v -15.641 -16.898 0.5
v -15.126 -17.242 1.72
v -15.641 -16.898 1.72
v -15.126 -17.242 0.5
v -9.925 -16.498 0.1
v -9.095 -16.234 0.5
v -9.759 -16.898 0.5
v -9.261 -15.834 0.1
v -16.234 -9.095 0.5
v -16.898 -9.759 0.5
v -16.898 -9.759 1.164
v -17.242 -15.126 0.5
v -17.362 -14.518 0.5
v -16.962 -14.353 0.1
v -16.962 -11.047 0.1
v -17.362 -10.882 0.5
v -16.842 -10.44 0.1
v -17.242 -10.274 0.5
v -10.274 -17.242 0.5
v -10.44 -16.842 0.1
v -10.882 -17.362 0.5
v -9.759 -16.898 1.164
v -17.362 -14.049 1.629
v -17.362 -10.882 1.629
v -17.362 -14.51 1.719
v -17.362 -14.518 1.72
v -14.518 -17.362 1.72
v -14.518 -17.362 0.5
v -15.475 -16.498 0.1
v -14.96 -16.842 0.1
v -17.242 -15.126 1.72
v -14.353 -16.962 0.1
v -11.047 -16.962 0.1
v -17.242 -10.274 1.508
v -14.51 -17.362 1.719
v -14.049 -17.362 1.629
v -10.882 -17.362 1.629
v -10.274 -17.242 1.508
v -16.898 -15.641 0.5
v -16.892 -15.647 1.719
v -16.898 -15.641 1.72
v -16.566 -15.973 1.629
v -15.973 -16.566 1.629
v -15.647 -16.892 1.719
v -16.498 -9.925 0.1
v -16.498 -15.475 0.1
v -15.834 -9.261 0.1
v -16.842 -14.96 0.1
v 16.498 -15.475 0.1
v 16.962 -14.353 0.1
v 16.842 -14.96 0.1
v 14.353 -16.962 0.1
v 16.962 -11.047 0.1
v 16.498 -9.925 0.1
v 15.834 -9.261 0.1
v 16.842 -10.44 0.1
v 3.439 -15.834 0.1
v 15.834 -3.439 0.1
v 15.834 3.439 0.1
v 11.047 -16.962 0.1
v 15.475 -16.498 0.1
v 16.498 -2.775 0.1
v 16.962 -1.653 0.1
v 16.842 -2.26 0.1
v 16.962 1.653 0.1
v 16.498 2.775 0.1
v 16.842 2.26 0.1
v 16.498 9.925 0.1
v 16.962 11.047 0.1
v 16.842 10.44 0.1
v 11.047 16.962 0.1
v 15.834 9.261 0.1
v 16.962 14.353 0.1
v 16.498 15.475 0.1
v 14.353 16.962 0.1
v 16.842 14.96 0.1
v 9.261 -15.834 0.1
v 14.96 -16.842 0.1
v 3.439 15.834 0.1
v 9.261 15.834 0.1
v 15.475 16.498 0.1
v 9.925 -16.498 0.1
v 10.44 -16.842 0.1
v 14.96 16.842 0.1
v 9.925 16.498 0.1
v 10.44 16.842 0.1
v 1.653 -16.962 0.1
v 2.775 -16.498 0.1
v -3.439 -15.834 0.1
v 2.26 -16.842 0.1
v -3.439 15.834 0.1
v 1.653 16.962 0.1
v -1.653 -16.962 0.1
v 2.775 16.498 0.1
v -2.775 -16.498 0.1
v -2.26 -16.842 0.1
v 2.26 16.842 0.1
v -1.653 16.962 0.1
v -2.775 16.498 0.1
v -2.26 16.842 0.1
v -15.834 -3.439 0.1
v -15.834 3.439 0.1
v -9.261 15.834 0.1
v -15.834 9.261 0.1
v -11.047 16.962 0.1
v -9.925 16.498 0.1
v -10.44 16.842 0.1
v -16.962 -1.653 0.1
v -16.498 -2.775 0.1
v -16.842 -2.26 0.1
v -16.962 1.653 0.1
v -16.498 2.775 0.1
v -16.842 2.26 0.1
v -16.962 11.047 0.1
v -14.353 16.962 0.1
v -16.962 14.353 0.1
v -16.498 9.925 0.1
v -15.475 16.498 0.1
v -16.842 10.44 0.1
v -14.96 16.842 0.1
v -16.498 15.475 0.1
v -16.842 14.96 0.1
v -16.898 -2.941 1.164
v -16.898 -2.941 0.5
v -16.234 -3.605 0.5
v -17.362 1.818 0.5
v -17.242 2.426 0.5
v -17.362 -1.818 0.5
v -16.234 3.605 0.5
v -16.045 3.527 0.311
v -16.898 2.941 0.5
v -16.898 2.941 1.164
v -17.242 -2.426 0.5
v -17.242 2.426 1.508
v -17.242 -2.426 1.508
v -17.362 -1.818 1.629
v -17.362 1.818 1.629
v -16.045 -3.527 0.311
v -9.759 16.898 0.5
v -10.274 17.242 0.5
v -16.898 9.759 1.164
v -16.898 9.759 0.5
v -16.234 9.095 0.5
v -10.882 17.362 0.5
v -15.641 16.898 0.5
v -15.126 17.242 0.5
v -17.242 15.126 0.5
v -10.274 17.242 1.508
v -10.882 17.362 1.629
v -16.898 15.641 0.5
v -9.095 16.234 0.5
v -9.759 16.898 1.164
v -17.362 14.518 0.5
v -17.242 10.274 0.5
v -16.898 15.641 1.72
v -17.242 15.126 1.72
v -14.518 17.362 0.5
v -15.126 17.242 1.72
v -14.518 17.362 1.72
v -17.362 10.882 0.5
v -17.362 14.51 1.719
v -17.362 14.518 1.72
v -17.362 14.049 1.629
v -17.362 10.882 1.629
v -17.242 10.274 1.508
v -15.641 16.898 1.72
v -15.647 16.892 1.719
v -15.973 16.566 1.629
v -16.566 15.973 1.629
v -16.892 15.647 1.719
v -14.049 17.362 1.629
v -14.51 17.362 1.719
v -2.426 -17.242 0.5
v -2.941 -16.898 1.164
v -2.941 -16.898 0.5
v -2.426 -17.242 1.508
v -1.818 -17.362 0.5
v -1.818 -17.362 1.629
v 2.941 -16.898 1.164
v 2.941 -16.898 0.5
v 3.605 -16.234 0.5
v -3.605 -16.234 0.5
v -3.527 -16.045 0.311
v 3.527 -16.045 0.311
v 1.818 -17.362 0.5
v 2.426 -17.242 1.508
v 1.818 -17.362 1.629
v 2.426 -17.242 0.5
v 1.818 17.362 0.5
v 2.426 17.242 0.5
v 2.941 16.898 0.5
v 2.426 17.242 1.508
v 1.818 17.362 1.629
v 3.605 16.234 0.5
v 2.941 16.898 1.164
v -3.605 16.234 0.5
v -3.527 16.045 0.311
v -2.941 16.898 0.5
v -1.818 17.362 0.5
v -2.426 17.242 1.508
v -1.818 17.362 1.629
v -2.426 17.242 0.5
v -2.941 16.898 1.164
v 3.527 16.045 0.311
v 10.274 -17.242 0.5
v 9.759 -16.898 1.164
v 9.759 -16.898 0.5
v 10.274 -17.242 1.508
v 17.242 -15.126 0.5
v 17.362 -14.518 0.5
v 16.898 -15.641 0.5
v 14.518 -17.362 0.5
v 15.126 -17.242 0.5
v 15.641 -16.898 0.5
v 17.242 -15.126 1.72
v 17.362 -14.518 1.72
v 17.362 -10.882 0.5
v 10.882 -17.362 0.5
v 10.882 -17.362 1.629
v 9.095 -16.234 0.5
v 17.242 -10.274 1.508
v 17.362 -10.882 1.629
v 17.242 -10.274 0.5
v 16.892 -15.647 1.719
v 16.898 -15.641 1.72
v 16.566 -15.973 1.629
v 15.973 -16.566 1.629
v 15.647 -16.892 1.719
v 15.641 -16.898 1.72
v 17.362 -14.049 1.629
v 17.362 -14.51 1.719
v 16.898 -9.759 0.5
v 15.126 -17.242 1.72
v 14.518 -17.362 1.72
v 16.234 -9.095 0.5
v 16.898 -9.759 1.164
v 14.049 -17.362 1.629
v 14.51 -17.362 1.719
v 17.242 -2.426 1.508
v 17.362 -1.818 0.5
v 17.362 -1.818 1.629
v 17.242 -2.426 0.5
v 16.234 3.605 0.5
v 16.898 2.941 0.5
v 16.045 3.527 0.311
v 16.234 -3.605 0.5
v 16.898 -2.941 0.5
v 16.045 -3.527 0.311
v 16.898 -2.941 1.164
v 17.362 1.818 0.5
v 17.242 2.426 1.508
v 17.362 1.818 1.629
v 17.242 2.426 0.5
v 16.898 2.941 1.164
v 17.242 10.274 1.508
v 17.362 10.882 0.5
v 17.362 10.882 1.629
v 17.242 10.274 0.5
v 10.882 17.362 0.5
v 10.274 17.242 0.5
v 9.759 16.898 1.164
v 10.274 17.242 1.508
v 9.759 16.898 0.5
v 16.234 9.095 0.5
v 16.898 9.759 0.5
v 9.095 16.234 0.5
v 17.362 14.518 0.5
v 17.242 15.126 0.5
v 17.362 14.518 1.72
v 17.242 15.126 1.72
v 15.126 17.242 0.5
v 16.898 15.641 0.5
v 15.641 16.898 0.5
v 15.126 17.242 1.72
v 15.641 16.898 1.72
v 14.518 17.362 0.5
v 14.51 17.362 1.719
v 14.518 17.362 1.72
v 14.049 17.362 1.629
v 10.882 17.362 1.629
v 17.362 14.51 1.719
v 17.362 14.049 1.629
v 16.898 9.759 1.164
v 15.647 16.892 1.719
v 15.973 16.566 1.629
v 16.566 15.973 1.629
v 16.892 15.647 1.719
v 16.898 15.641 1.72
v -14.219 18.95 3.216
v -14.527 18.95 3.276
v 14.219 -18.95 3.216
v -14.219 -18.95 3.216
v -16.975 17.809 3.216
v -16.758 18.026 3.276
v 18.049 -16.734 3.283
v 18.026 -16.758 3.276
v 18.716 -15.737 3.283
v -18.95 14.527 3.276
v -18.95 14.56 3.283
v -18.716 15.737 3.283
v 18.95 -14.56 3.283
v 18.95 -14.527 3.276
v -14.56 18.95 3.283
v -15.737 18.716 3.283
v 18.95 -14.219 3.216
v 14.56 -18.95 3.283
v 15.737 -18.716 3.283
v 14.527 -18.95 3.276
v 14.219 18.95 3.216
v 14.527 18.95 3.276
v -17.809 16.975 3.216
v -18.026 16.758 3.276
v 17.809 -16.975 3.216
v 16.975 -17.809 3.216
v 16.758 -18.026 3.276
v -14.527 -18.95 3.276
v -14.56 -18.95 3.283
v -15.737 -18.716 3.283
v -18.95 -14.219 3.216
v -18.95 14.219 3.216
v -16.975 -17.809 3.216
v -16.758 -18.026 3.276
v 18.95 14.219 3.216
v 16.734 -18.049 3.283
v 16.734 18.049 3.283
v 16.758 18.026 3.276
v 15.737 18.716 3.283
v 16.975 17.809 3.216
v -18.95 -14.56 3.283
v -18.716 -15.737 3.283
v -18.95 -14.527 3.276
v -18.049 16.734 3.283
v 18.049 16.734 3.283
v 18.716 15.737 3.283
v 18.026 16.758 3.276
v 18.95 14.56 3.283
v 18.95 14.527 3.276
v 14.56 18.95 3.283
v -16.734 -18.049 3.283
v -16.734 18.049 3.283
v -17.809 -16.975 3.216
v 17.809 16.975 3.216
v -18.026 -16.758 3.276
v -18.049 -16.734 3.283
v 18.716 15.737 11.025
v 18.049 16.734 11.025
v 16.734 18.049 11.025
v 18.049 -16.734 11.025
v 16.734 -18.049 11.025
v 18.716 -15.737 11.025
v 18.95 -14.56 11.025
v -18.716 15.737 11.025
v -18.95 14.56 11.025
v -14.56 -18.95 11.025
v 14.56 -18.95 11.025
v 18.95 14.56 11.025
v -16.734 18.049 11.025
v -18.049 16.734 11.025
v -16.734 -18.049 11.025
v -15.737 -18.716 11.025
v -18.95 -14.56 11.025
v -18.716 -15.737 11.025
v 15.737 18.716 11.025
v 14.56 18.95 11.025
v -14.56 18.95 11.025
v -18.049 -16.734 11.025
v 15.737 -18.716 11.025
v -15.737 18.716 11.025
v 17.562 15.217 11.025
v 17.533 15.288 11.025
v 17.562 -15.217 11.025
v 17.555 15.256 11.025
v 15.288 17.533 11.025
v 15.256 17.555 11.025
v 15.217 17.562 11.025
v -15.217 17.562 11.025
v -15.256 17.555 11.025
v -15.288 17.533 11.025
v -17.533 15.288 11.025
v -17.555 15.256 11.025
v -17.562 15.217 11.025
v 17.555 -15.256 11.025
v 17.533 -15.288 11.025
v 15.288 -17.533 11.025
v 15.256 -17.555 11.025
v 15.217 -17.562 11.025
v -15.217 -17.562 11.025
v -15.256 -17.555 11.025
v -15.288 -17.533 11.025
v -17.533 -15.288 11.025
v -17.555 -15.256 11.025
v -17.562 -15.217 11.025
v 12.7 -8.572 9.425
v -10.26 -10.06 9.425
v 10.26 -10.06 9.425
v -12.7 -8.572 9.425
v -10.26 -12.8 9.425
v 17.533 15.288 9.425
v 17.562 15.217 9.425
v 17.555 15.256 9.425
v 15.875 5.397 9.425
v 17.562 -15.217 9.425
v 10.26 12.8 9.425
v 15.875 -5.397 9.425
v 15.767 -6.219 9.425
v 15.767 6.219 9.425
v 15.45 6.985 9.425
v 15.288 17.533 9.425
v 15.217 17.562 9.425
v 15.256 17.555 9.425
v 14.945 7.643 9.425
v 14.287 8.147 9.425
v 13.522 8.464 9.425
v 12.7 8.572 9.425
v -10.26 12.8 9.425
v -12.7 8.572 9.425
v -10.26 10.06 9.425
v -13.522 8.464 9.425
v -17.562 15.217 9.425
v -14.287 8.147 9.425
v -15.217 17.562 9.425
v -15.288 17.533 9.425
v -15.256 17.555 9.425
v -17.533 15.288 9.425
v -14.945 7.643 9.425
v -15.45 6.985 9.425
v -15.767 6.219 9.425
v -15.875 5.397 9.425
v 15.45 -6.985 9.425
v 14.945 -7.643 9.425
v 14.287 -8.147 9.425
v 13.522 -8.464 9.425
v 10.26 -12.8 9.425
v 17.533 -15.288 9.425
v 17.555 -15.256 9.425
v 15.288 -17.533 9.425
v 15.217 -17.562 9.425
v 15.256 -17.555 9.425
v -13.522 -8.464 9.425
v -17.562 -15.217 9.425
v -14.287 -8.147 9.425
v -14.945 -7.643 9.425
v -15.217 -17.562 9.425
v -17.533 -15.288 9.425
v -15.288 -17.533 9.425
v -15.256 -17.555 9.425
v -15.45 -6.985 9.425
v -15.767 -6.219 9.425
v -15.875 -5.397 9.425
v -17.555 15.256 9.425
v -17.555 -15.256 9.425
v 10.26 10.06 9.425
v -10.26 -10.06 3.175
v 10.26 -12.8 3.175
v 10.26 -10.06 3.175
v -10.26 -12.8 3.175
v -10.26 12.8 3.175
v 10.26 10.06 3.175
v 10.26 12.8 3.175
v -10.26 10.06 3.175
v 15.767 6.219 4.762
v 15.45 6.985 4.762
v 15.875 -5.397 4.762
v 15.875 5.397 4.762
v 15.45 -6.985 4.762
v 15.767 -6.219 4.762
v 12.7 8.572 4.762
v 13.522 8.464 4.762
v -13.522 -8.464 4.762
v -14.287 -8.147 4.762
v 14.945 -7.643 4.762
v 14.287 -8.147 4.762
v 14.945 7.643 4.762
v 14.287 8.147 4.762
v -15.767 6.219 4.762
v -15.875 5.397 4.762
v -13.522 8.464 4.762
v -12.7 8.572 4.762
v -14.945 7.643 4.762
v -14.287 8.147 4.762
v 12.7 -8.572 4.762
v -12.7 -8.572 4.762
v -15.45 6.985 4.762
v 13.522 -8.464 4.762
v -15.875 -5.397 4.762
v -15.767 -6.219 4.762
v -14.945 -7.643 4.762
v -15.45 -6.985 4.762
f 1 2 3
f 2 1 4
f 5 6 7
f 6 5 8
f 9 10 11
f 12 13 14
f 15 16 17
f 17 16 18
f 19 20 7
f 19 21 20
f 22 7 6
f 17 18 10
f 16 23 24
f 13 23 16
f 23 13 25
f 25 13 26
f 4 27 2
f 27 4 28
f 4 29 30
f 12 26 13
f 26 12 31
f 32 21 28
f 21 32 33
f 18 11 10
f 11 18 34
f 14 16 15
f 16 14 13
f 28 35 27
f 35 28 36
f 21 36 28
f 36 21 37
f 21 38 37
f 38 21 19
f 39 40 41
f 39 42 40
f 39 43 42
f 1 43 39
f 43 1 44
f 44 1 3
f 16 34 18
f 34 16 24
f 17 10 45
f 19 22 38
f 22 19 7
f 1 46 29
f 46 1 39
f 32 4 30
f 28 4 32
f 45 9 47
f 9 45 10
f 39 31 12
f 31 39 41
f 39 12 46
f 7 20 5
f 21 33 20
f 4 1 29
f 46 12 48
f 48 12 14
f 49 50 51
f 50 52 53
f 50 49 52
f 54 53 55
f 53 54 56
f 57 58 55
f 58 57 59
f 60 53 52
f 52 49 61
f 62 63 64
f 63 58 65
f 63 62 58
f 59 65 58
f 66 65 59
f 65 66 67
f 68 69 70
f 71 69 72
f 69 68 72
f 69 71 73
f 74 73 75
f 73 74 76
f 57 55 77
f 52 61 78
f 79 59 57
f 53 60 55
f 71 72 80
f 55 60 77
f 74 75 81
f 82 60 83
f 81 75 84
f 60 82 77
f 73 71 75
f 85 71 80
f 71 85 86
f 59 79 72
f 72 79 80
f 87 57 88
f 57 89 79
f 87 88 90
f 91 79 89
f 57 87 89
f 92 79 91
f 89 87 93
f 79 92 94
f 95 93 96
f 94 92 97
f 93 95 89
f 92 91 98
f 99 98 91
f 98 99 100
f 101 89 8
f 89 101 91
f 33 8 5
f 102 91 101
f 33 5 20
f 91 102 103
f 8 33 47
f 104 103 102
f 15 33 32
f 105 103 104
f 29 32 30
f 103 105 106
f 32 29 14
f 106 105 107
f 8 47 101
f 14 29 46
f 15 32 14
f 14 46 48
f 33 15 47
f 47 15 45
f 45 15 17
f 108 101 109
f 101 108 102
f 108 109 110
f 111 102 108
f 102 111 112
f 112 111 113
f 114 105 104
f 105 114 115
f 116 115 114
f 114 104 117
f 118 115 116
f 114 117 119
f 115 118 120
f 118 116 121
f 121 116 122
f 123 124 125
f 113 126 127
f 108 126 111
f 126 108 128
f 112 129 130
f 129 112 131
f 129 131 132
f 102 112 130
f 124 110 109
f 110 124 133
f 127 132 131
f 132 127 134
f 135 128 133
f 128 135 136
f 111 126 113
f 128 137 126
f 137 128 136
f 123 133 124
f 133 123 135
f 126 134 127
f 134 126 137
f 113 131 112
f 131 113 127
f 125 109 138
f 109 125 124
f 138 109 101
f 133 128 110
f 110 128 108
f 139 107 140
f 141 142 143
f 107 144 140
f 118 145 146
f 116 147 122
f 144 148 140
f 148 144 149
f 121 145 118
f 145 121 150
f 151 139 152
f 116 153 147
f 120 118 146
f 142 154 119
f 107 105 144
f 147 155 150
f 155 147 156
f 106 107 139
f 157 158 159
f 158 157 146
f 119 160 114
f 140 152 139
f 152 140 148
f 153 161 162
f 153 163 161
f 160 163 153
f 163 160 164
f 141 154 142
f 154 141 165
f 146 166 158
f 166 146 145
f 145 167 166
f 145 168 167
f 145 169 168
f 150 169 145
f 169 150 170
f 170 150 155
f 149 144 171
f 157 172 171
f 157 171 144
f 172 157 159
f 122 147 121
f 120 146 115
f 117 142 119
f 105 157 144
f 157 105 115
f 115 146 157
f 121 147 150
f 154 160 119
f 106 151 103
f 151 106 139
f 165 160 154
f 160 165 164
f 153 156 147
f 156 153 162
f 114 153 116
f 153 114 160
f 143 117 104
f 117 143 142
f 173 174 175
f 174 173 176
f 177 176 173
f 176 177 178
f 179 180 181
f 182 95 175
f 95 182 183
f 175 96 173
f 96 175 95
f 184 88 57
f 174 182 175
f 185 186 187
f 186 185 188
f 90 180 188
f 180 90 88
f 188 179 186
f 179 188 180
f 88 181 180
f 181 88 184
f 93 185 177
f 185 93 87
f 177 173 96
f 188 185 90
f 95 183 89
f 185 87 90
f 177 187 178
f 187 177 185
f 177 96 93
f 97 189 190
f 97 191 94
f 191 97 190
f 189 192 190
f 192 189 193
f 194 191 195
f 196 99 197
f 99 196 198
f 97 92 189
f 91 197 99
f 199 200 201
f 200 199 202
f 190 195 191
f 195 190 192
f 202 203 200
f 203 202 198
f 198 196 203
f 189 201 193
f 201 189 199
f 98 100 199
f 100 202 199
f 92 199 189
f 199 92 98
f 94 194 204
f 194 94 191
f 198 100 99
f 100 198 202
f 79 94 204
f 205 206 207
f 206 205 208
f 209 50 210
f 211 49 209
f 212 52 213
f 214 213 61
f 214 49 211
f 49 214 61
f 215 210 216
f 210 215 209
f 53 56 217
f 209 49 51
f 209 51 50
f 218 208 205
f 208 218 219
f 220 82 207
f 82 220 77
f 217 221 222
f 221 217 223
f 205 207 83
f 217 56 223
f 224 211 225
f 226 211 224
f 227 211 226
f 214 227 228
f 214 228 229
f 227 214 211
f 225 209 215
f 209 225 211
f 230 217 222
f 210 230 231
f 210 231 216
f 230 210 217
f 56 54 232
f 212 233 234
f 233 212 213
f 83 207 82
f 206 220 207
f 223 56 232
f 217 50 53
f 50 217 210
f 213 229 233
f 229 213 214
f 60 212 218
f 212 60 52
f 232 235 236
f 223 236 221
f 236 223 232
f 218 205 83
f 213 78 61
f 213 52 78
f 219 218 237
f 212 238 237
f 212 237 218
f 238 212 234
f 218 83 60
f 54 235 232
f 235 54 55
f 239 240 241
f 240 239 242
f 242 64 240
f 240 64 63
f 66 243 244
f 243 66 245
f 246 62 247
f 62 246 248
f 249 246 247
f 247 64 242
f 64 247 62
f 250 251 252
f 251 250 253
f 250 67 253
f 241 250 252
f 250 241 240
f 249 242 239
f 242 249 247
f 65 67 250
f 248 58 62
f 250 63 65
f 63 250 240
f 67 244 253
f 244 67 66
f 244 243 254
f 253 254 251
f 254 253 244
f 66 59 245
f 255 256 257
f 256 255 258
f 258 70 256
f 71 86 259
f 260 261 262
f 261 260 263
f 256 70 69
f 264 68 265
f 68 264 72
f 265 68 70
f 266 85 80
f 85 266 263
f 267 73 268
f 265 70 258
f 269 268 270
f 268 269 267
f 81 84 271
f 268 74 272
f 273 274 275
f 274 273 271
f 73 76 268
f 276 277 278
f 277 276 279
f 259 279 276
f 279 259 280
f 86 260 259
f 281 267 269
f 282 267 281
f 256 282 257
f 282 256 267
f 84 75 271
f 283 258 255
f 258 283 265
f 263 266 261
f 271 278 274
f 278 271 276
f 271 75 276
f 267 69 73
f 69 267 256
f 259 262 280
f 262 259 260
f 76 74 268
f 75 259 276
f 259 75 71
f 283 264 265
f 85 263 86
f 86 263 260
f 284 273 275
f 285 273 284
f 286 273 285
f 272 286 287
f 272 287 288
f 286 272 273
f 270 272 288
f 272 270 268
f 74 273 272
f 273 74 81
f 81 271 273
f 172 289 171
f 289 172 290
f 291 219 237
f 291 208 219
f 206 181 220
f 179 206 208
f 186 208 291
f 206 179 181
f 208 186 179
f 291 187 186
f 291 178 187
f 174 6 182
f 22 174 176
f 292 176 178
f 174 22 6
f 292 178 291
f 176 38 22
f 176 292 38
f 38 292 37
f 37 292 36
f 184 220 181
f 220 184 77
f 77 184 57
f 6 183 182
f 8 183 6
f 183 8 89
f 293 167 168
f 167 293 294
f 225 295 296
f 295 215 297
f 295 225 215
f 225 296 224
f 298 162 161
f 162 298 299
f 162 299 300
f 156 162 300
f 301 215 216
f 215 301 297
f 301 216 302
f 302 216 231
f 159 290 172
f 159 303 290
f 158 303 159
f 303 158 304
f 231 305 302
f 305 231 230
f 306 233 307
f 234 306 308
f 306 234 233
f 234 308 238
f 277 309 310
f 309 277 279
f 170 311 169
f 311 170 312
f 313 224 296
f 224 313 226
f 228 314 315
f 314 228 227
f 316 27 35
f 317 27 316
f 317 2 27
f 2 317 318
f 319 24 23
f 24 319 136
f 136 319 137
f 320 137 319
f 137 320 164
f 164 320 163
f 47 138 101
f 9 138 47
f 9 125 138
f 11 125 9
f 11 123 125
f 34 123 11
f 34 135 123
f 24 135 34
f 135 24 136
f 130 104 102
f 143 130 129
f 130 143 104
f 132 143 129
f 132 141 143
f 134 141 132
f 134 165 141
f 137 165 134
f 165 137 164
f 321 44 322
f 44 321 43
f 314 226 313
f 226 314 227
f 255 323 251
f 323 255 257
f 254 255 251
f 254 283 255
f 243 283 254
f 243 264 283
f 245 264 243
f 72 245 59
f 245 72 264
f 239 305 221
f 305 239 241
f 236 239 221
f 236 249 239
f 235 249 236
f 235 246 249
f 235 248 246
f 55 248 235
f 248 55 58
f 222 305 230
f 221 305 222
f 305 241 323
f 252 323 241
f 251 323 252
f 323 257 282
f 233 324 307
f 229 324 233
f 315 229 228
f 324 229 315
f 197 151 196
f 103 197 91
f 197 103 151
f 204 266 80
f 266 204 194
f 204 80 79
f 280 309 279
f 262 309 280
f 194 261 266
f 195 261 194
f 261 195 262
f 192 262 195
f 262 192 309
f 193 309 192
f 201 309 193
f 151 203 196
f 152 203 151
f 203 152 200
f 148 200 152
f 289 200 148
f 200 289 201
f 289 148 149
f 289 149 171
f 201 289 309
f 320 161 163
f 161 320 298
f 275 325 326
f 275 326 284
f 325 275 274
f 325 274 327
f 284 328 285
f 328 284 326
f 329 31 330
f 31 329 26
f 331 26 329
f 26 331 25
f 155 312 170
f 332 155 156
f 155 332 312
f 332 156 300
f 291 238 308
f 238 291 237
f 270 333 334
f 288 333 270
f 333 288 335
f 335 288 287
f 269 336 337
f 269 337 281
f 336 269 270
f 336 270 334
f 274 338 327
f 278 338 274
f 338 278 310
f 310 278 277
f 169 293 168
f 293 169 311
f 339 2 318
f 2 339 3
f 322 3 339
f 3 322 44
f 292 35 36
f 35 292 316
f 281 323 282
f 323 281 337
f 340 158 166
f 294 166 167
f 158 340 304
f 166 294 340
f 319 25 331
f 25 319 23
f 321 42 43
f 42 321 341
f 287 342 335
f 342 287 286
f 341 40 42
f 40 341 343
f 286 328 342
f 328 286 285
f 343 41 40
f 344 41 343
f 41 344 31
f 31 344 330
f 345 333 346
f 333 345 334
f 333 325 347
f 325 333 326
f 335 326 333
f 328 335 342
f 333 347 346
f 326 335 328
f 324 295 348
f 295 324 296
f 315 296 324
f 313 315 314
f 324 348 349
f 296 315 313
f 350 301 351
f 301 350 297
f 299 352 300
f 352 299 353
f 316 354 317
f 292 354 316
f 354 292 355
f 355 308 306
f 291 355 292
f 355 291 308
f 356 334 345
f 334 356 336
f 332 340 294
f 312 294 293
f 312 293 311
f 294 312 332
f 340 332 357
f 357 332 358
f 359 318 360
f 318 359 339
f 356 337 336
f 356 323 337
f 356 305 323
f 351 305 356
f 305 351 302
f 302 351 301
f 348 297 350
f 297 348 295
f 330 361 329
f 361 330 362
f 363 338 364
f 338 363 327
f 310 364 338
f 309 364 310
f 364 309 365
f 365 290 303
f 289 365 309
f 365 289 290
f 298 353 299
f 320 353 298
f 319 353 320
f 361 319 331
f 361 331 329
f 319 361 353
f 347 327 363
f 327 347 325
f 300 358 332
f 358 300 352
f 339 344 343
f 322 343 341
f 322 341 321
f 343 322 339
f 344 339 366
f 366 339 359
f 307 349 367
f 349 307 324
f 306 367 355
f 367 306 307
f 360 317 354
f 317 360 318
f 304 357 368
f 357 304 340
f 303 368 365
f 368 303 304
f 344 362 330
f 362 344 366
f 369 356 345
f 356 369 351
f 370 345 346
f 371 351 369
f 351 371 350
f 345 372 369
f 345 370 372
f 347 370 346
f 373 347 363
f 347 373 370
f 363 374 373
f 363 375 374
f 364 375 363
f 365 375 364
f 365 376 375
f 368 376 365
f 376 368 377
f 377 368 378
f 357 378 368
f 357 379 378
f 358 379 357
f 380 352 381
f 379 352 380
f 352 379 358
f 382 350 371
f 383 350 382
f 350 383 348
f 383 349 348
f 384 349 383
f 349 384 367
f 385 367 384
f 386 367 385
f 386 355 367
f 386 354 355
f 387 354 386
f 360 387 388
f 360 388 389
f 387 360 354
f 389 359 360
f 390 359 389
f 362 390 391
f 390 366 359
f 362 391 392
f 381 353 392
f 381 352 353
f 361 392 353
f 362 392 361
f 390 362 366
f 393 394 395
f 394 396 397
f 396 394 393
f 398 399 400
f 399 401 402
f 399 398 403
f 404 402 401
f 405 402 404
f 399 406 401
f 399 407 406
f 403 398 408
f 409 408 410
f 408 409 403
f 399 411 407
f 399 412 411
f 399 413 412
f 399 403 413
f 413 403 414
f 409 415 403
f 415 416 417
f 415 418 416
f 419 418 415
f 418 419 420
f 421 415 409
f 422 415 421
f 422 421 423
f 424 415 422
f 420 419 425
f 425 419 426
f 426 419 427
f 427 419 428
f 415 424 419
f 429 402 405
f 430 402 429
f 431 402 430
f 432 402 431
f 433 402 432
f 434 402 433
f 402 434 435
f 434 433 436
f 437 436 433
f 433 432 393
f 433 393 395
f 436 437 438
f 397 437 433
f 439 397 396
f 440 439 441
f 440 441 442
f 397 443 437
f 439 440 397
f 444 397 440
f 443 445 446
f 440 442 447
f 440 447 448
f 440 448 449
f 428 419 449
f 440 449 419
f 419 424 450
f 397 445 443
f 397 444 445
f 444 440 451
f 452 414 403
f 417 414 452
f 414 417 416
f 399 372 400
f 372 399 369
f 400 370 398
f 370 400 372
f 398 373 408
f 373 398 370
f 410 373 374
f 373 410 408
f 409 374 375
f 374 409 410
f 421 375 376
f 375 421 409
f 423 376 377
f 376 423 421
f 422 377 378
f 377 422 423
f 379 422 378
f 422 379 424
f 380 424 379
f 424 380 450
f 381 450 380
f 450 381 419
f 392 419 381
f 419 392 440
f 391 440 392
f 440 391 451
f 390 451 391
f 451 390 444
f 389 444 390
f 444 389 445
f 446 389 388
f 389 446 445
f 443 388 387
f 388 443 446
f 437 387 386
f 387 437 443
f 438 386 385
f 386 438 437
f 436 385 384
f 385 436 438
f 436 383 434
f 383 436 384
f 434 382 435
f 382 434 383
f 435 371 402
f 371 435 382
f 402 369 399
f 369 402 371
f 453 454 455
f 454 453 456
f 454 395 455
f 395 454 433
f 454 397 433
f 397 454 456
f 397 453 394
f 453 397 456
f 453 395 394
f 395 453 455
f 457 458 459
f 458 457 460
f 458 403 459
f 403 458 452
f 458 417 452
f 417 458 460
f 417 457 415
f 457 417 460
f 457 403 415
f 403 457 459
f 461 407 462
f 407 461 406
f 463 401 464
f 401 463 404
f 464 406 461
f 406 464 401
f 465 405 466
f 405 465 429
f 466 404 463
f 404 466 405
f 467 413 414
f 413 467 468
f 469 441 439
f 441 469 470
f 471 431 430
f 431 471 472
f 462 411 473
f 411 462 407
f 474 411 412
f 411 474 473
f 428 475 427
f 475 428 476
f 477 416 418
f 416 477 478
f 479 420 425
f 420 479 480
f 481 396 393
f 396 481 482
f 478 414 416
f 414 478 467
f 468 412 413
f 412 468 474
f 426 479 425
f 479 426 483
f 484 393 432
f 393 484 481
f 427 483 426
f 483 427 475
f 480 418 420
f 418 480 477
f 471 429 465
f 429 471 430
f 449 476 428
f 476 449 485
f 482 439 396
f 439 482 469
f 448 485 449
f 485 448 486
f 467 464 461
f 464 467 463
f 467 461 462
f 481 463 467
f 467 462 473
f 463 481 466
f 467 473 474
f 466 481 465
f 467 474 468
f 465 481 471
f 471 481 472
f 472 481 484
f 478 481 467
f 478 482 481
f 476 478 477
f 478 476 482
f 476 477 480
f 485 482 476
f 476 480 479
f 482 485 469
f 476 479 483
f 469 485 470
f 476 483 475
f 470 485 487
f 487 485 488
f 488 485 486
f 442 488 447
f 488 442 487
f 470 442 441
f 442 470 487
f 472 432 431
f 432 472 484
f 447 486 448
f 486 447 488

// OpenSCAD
// WeMosHeaderHolder0.2
// 
// Holds two rows of 'female dupont' headers
// straight so that you can set your WeMos D1 mini on top
// (CPU side down, by convention) and solder the legs on.
// 
// Changes:
// v0.2:
// - Allow header_cutout_size[0] = "auto", which makes it the full
//   width with rounded corners, similar to the central cavity

block_size      = ["1chunk","1chunk","3/8inch"];
header_cutout_size = ["8/10inch","1/10inch","1/4inch"];
header_cutout_row_spacing = "9/10inch";
header_cutout_margin  = "0.1mm";

cross_section = false;

$fn = 24;
$tgx11_offset = -0.1;

use <../lib/TGx11.1Lib.scad>
use <../lib/TOGMod1.scad>
use <../lib/TOGMod1Constructors.scad>
use <../lib/TOGUnits1.scad>
use <../lib/TOGPolyhedronLib1.scad>

$togridlib3_unit_table = tgx11_get_default_unit_table();

function reverse_list(list) =
	[for(i=[len(list)-1 : -1 : 0]) list[i]];

function mirror_rathnodes(nodes) = [
	for(n=nodes) n,
	for(n=reverse_list(nodes)) [n[0], [-n[1][0], n[1][1]], for(i=[2:1:len(n)-1]) n[i]],
];

block_size_ca = togunits1_vec_to_cas(block_size);
block_size_mm = togunits1_decode_vec(block_size_ca);
header_cutout_margin_mm      = togunits1_decode(    header_cutout_margin     );

central_cavity_width_mm = block_size_mm[0] - 2*3.175;

header_cutout_size_fixed = [
	header_cutout_size[0] == "auto" ? central_cavity_width_mm - header_cutout_margin_mm*2 : header_cutout_size[0],
	header_cutout_size[1],
	header_cutout_size[2],
];

header_cutout_size_mm        = togunits1_decode_vec(header_cutout_size_fixed );
header_cutout_row_spacing_mm = togunits1_decode(    header_cutout_row_spacing);



// togmod1_domodule(togmod1_linear_extrude_z([0, length_mm], the_clip_2d));

deck_z = block_size_mm[2];

header_cutout = togmod1_linear_extrude_z([-header_cutout_size_mm[2], 1],
	togmod1_make_rounded_rect([
		header_cutout_size_mm[0] + header_cutout_margin_mm*2,
		header_cutout_size_mm[1] + header_cutout_margin_mm*2,
	], r = header_cutout_size[0] == "auto" ? min(header_cutout_size_mm[0],header_cutout_size_mm[1]+header_cutout_margin_mm*2)*127/255 : 0)
);

the_cavity = ["union",
	// HEader holders
	for( ym=[-1,1] ) ["translate", [0,ym*header_cutout_row_spacing_mm/2,deck_z], header_cutout],
	
   // Central 'decorative' cavity
	["translate", [0,0,deck_z],
	   tphl1_make_rounded_cuboid([
			central_cavity_width_mm,
			header_cutout_row_spacing_mm - header_cutout_size_mm[1] - 2*254/160,
			(deck_z-25.4*3/16)*2
		], r=[3.175,3.175,0], corner_shape="ovoid1")],
];

the_thing = ["difference",
	tgx11_block(
		block_size_ca,
		bottom_segmentation = "chatom",
		bottom_foot_bevel = 0.4,
		top_segmentation = "block",
		lip_height = 1.5
	),
	
	the_cavity
];

togmod1_domodule(["difference",
	the_thing,
	
	if( cross_section ) ["translate",
		[-block_size_mm[0]/2,-block_size_mm[1]/2,block_size_mm[2]/2],
		togmod1_make_cuboid([block_size_mm[0], block_size_mm[1], block_size_mm[2]*2])
	],
]);
